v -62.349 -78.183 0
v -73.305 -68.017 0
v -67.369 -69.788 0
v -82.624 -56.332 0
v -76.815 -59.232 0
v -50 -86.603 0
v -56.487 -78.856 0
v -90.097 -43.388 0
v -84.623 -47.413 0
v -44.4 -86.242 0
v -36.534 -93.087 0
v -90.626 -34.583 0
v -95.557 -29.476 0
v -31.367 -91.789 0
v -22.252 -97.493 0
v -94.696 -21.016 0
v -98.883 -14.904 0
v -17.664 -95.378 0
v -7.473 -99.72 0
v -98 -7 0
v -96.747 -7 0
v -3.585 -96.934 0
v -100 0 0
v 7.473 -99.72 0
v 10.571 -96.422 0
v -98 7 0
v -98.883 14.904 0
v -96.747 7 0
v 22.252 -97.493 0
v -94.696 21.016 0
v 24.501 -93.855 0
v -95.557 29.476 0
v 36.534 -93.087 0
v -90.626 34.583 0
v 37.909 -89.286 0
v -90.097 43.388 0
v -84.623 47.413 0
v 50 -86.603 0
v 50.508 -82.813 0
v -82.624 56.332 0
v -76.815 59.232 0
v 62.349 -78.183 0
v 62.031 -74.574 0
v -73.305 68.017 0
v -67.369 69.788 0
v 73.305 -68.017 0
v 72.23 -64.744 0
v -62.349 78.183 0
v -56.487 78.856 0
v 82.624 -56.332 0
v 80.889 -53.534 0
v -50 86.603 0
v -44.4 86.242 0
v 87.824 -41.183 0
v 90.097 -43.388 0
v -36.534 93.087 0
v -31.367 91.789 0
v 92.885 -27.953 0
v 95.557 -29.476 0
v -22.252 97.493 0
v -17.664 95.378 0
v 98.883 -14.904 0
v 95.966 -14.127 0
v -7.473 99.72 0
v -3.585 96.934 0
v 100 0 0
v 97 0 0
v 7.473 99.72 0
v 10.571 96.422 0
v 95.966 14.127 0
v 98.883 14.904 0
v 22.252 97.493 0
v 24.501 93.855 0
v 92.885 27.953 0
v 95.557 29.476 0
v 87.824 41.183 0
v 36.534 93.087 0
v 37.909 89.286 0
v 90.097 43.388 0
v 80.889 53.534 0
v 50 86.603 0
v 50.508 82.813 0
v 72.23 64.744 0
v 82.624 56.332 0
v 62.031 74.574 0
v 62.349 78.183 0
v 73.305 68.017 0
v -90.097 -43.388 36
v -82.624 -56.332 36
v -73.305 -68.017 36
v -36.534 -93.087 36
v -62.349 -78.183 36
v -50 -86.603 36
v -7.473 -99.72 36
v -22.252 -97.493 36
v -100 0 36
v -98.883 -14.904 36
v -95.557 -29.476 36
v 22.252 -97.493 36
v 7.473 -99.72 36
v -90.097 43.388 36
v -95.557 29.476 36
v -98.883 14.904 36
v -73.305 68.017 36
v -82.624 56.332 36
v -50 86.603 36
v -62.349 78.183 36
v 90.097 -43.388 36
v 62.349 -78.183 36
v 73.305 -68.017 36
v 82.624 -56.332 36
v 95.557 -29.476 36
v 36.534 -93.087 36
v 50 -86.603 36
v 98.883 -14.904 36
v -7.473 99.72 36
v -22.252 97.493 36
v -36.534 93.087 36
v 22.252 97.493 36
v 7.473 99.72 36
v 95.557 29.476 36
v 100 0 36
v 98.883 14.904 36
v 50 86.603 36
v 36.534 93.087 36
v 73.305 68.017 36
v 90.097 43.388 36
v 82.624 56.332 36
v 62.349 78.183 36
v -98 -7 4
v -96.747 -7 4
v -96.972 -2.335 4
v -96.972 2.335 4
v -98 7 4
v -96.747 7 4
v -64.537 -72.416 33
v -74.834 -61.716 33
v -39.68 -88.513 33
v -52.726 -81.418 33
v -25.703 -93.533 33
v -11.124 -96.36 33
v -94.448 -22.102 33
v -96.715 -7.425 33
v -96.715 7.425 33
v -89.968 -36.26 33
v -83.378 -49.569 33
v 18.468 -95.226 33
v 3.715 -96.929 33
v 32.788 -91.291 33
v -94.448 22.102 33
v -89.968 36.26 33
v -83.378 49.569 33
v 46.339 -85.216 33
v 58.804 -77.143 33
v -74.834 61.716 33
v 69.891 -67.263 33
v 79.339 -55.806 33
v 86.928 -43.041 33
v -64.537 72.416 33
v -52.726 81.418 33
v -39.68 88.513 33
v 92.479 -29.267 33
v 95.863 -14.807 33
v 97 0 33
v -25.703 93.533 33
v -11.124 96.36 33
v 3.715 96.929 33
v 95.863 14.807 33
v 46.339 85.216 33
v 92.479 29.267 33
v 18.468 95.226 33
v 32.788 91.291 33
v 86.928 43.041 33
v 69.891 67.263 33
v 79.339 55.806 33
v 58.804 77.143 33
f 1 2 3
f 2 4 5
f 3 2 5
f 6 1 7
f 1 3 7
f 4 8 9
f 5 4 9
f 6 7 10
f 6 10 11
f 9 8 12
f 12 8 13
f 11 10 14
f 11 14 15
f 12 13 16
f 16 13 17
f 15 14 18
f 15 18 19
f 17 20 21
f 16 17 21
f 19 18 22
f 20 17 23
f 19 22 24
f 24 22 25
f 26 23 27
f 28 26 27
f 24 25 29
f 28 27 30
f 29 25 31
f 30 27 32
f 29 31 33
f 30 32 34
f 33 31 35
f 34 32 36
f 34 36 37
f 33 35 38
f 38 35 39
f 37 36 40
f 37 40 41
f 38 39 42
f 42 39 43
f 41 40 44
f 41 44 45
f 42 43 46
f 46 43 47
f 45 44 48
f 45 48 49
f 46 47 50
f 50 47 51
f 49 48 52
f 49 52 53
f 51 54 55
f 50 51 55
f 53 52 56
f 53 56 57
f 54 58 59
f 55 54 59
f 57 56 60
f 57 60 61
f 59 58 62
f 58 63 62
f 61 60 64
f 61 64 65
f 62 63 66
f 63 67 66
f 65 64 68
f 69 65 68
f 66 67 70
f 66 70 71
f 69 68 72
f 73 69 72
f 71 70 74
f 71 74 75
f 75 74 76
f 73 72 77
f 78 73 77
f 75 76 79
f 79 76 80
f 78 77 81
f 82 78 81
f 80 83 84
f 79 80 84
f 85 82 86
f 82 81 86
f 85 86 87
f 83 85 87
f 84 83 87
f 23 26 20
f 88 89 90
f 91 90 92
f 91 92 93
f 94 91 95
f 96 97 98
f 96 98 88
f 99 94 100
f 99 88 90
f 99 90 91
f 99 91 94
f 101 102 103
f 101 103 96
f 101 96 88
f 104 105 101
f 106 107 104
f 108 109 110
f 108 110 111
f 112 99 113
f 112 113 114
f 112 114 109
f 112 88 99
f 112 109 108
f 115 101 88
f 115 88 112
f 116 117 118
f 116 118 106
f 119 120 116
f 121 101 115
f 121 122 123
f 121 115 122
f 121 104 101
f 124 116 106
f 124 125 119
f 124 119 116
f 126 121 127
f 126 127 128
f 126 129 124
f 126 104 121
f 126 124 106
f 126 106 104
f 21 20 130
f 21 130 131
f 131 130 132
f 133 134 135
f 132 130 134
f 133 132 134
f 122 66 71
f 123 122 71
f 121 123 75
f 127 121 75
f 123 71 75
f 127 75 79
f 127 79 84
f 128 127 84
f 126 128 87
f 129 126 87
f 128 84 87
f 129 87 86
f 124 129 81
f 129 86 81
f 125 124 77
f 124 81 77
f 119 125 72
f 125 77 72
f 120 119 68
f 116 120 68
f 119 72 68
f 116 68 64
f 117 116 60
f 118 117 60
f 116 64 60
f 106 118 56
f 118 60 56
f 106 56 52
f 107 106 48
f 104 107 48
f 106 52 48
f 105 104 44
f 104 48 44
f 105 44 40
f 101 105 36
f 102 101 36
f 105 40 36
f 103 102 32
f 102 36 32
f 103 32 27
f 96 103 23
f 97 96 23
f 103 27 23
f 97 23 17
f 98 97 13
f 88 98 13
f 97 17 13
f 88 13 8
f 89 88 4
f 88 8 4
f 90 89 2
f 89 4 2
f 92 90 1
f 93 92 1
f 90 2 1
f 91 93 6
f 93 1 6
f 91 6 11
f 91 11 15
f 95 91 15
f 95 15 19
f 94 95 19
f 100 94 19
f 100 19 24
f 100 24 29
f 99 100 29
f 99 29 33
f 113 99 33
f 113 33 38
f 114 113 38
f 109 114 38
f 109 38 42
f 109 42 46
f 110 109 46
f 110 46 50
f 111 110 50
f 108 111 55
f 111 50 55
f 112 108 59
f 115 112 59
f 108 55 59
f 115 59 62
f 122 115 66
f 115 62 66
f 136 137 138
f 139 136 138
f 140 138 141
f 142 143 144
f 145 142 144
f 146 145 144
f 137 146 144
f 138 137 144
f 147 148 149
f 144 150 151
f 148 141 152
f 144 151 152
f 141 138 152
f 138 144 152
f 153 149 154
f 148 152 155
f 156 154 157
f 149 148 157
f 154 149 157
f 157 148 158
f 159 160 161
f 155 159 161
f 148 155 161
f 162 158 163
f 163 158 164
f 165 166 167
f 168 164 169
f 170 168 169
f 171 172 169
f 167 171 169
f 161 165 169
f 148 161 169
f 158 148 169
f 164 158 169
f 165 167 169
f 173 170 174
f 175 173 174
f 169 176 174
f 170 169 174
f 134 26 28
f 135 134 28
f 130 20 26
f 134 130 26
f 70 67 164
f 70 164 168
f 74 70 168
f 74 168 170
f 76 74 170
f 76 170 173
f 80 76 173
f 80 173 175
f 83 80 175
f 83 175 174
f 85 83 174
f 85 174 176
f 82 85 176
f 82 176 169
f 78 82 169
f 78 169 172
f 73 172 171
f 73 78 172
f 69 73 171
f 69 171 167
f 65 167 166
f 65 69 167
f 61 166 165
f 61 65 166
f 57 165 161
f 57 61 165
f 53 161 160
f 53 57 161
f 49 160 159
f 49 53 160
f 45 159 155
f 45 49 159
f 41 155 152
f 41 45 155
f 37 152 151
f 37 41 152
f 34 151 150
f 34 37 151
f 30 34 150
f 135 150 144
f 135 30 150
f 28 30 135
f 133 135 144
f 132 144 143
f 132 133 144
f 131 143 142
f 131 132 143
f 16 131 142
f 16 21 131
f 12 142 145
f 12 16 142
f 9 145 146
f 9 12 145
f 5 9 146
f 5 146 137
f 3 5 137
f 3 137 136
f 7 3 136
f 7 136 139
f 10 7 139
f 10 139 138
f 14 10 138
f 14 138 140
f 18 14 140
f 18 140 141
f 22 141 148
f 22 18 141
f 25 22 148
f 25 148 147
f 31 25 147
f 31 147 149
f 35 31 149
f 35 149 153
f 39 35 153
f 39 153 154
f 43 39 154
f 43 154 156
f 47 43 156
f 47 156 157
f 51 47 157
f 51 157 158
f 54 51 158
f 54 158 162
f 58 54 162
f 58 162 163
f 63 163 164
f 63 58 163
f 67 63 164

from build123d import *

# Parameters (mm, degrees)
SKETCH1_R           = 100
BOSS_EXTRUDE1_DEPTH = 36
SKETCH2_R           = 97
CUT_EXTRUDE2_DEPTH  = 33
SKETCH3_R           = 1.75
SKETCH3_R_2         = 7
SKETCH3_W           = 10
SKETCH3_H           = 14
CUT_EXTRUDE4_DEPTH  = 4


with BuildPart() as part:
    # Sketch1 → Boss-Extrude1 (new body)
    with BuildSketch(Plane.XY):
        Circle(SKETCH1_R)
    extrude(amount=BOSS_EXTRUDE1_DEPTH)

    # Sketch2 → Cut-Extrude2 (cut)
    with BuildSketch(Plane.XY):
        Circle(SKETCH2_R)
    extrude(amount=CUT_EXTRUDE2_DEPTH, mode=Mode.SUBTRACT)

    # Sketch3 → Cut-Extrude4 (cut)
    with BuildSketch(Plane.XY):
        with Locations((110, 24.75)):
            Circle(SKETCH3_R)
        with Locations((110, -24.75)):
            Circle(SKETCH3_R)
        with Locations((110, 0)):
            Circle(SKETCH3_R_2)
        with Locations((-93, 0)):
            Rectangle(SKETCH3_W, SKETCH3_H)
    extrude(amount=CUT_EXTRUDE4_DEPTH, mode=Mode.SUBTRACT)


solid = part.part
